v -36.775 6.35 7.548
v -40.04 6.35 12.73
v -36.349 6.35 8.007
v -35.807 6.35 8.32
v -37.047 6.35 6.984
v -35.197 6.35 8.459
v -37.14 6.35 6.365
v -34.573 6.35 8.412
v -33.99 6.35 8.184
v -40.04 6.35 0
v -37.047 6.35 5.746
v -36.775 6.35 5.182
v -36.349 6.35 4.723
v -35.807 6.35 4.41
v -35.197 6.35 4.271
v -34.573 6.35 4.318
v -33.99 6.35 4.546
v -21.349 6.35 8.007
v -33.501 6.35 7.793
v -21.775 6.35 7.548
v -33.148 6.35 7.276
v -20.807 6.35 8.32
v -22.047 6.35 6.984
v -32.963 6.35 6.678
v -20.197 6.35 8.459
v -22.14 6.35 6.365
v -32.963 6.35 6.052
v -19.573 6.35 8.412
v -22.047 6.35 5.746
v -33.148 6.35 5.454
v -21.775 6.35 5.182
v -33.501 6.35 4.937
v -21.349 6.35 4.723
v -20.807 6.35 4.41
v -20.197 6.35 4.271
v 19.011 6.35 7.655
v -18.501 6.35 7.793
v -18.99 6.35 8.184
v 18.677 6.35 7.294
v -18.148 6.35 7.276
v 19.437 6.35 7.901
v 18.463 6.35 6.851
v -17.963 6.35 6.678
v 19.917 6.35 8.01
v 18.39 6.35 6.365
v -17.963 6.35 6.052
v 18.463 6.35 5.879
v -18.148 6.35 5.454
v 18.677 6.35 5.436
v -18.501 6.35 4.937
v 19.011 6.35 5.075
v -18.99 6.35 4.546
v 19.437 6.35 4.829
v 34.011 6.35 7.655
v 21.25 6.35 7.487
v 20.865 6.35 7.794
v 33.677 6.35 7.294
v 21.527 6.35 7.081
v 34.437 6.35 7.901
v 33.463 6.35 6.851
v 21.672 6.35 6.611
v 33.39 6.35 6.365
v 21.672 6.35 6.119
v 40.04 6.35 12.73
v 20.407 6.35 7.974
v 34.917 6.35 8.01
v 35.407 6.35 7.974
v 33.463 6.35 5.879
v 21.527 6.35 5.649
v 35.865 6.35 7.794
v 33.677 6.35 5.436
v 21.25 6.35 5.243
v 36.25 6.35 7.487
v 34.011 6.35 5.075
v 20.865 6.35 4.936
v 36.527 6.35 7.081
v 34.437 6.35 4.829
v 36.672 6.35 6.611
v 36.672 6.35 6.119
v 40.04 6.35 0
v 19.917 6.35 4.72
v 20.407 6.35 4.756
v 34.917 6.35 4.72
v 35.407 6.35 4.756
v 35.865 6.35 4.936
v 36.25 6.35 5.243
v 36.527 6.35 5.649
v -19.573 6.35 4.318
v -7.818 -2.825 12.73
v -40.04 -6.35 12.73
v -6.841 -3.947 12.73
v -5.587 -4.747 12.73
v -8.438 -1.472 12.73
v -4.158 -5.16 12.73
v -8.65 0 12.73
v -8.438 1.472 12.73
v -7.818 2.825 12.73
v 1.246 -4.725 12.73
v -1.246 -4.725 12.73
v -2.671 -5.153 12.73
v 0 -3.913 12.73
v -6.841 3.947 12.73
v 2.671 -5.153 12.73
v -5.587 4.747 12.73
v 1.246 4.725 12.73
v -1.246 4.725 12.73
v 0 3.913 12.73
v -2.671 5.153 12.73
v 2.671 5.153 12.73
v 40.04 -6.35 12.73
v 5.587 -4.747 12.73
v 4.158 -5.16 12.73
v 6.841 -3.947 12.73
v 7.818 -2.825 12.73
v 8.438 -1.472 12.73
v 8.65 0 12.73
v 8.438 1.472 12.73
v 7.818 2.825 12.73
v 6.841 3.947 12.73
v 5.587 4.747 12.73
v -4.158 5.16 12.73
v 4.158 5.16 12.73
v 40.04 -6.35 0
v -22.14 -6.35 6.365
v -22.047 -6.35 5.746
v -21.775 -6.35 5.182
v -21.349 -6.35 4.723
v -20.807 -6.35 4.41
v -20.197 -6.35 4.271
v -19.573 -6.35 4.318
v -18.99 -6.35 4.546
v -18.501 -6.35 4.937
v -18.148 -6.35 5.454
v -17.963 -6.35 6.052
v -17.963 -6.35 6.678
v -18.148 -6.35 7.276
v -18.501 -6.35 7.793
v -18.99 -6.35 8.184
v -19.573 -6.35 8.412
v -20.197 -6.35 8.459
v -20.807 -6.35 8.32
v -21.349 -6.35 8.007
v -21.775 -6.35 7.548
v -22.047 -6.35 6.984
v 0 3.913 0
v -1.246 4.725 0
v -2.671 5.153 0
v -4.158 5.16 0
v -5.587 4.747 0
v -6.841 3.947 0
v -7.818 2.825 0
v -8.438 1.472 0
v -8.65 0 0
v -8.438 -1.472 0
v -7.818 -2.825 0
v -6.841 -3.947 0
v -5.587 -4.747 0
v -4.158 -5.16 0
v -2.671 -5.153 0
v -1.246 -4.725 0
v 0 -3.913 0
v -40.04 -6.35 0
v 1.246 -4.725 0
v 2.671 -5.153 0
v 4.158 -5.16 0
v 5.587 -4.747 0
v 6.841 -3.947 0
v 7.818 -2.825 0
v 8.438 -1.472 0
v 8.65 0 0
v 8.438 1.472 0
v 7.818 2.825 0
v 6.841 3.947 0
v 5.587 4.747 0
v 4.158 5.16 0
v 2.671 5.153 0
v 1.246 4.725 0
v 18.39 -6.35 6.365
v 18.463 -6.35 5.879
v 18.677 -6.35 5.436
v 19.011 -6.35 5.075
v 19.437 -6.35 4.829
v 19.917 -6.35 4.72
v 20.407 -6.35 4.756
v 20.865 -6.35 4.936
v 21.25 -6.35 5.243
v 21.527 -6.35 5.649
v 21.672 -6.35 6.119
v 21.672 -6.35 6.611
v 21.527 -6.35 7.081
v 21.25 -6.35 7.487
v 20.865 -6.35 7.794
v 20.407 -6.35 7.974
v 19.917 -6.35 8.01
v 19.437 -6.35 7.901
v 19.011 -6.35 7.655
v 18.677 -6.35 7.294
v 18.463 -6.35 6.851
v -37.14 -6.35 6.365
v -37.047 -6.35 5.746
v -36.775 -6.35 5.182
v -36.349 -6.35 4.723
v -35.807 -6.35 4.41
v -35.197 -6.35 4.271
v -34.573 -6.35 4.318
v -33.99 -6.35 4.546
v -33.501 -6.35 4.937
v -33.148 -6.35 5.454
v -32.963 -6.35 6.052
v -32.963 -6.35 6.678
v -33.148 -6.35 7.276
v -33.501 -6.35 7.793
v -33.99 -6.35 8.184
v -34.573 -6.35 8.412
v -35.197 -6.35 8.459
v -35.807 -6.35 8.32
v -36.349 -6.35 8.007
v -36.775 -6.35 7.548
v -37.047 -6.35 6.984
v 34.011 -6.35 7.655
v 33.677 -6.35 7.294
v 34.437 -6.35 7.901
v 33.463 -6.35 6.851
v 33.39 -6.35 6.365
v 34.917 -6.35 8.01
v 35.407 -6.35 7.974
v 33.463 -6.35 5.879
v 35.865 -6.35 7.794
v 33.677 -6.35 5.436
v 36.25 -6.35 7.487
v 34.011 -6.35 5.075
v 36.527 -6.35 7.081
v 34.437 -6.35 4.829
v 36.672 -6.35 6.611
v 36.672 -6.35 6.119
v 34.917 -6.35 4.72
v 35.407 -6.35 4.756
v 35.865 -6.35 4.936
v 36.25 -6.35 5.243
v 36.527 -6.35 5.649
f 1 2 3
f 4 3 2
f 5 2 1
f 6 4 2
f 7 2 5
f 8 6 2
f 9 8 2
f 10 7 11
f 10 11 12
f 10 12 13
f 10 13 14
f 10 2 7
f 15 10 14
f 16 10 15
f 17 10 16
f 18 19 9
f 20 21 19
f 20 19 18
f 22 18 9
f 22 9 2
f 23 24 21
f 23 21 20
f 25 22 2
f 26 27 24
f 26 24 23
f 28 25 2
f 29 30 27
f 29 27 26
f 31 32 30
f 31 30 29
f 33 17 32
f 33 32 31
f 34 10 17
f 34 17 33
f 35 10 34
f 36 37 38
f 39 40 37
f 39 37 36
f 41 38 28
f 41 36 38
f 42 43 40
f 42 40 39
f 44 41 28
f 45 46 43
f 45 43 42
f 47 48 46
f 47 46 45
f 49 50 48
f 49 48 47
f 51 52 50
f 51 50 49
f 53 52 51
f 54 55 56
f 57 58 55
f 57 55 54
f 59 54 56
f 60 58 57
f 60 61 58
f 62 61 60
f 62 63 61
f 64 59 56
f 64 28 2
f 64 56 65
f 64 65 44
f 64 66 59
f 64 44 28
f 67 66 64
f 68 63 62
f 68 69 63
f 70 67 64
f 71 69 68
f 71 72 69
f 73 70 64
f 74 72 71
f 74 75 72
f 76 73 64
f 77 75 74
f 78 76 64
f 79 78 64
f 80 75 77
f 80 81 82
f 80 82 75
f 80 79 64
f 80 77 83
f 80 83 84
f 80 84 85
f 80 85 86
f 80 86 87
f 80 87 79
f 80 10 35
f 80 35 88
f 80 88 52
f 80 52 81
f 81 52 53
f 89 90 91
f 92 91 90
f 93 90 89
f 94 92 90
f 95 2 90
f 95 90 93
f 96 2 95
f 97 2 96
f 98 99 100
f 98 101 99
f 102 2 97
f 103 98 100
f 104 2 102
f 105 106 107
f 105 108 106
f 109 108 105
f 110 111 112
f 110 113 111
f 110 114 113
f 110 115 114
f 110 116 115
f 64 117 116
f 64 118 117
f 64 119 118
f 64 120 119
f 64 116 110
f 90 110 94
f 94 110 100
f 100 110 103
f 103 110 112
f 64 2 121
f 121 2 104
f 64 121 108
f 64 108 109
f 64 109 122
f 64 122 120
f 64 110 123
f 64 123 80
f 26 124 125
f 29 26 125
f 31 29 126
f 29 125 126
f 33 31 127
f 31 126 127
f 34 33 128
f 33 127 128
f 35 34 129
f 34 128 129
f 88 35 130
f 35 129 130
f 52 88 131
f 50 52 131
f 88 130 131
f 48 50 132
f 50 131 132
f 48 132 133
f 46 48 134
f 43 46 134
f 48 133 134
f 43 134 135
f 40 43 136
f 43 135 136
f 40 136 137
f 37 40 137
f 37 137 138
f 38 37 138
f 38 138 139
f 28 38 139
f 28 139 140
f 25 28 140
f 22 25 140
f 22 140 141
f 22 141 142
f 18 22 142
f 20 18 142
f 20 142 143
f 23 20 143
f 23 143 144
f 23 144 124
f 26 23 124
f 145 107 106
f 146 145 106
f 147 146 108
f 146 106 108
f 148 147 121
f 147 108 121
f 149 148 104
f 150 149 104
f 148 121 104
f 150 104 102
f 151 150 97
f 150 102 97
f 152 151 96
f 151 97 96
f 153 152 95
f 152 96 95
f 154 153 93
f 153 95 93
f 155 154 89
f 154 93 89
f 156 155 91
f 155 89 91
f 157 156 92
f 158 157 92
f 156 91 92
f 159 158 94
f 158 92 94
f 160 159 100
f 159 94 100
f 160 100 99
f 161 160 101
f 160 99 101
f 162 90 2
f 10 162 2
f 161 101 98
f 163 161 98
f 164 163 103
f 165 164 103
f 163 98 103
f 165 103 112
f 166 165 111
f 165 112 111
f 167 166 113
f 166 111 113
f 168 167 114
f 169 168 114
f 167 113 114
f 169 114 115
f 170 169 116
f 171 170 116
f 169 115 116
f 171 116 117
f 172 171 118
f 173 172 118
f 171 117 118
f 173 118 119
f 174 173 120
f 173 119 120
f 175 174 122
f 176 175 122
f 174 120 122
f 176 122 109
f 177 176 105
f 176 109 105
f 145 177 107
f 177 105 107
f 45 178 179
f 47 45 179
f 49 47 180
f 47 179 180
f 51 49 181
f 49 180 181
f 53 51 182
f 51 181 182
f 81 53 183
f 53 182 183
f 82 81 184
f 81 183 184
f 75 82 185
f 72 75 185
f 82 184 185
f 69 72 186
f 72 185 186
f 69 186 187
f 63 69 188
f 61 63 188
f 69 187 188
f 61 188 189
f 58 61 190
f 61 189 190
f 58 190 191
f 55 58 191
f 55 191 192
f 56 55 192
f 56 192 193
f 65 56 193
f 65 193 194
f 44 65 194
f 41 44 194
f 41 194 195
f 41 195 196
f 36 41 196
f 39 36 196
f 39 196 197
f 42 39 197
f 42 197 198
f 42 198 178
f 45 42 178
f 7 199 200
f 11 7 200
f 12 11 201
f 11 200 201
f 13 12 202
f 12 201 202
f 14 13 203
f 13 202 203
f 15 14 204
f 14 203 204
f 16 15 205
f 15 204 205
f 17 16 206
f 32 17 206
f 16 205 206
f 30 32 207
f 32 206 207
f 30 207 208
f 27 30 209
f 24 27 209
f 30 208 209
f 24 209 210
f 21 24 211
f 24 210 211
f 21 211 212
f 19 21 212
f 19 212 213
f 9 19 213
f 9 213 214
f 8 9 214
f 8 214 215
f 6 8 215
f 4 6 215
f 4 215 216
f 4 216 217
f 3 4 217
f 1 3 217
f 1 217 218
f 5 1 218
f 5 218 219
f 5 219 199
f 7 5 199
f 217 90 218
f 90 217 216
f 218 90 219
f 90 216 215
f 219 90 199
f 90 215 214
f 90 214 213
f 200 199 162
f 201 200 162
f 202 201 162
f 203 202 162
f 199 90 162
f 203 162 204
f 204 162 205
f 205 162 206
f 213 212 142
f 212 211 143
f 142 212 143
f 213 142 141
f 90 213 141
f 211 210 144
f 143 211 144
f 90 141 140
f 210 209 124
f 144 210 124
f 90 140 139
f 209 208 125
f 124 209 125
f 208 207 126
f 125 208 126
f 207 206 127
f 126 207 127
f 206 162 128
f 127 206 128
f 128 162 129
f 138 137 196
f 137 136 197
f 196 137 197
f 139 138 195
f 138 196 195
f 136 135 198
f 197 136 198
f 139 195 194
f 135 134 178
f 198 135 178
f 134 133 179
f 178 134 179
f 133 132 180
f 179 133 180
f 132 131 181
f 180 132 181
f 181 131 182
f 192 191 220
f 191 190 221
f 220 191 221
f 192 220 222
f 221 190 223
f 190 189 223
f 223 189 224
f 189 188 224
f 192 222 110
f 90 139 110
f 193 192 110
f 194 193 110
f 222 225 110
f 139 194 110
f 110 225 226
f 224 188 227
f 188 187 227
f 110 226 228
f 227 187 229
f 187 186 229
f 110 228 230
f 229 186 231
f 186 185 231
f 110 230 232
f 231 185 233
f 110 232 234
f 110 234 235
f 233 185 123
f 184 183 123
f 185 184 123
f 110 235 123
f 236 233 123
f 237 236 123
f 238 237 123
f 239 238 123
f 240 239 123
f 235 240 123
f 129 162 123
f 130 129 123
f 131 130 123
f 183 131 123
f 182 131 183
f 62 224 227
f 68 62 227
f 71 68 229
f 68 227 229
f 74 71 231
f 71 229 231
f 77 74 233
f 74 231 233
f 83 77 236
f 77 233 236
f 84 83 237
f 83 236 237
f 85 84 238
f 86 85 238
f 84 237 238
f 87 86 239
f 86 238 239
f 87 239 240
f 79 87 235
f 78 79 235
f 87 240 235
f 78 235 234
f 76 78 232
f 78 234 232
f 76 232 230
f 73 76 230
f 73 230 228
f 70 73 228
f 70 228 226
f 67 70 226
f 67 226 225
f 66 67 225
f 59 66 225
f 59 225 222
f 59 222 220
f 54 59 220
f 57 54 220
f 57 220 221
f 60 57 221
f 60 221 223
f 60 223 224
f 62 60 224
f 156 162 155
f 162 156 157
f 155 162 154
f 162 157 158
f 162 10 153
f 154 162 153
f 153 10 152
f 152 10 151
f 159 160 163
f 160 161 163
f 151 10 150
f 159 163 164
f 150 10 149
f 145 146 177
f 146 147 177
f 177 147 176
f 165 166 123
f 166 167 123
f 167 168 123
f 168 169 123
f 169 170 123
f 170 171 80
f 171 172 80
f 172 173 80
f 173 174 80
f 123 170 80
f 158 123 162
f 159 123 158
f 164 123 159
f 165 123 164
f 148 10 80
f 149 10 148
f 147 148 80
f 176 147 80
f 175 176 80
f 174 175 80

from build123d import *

# Parameters (mm, degrees)
SKETCH1_W             = 80.08
SKETCH1_H             = 12.7
BOSS_EXTRUDE1_DEPTH   = 12.73
M5X0_8_TAPPED_HOLE1_D = 4.2
M4X0_7_TAPPED_HOLE1_D = 3.3
SKETCH7_R             = 5.21
CUT_EXTRUDE1_DEPTH    = 12.73


with BuildPart() as part:
    # Sketch1 → Boss-Extrude1 (new body)
    with BuildSketch(Plane.XY):
        Rectangle(SKETCH1_W, SKETCH1_H)
    extrude(amount=BOSS_EXTRUDE1_DEPTH)

    # M5x0.8 Tapped Hole1 (through all)
    with Locations(Plane(origin=(0, 6.35, 0), x_dir=(1, 0, 0), z_dir=(0, 1, 0))):
        with Locations((-35.04, -6.365), (-20.04, -6.365)):
            Hole(M5X0_8_TAPPED_HOLE1_D / 2)

    # M4x0.7 Tapped Hole1 (through all)
    with Locations(Plane(origin=(0, 6.35, 0), x_dir=(1, 0, 0), z_dir=(0, 1, 0))):
        with Locations((20.04, -6.365), (35.04, -6.365)):
            Hole(M4X0_7_TAPPED_HOLE1_D / 2)

    # Sketch7 → Cut-Extrude1 (cut)
    with BuildSketch(Plane.XY.offset(12.73)):
        with Locations((3.44, 0)):
            Circle(SKETCH7_R)
        with Locations((-3.44, 0)):
            Circle(SKETCH7_R)
    extrude(amount=-CUT_EXTRUDE1_DEPTH, mode=Mode.SUBTRACT)


solid = part.part
